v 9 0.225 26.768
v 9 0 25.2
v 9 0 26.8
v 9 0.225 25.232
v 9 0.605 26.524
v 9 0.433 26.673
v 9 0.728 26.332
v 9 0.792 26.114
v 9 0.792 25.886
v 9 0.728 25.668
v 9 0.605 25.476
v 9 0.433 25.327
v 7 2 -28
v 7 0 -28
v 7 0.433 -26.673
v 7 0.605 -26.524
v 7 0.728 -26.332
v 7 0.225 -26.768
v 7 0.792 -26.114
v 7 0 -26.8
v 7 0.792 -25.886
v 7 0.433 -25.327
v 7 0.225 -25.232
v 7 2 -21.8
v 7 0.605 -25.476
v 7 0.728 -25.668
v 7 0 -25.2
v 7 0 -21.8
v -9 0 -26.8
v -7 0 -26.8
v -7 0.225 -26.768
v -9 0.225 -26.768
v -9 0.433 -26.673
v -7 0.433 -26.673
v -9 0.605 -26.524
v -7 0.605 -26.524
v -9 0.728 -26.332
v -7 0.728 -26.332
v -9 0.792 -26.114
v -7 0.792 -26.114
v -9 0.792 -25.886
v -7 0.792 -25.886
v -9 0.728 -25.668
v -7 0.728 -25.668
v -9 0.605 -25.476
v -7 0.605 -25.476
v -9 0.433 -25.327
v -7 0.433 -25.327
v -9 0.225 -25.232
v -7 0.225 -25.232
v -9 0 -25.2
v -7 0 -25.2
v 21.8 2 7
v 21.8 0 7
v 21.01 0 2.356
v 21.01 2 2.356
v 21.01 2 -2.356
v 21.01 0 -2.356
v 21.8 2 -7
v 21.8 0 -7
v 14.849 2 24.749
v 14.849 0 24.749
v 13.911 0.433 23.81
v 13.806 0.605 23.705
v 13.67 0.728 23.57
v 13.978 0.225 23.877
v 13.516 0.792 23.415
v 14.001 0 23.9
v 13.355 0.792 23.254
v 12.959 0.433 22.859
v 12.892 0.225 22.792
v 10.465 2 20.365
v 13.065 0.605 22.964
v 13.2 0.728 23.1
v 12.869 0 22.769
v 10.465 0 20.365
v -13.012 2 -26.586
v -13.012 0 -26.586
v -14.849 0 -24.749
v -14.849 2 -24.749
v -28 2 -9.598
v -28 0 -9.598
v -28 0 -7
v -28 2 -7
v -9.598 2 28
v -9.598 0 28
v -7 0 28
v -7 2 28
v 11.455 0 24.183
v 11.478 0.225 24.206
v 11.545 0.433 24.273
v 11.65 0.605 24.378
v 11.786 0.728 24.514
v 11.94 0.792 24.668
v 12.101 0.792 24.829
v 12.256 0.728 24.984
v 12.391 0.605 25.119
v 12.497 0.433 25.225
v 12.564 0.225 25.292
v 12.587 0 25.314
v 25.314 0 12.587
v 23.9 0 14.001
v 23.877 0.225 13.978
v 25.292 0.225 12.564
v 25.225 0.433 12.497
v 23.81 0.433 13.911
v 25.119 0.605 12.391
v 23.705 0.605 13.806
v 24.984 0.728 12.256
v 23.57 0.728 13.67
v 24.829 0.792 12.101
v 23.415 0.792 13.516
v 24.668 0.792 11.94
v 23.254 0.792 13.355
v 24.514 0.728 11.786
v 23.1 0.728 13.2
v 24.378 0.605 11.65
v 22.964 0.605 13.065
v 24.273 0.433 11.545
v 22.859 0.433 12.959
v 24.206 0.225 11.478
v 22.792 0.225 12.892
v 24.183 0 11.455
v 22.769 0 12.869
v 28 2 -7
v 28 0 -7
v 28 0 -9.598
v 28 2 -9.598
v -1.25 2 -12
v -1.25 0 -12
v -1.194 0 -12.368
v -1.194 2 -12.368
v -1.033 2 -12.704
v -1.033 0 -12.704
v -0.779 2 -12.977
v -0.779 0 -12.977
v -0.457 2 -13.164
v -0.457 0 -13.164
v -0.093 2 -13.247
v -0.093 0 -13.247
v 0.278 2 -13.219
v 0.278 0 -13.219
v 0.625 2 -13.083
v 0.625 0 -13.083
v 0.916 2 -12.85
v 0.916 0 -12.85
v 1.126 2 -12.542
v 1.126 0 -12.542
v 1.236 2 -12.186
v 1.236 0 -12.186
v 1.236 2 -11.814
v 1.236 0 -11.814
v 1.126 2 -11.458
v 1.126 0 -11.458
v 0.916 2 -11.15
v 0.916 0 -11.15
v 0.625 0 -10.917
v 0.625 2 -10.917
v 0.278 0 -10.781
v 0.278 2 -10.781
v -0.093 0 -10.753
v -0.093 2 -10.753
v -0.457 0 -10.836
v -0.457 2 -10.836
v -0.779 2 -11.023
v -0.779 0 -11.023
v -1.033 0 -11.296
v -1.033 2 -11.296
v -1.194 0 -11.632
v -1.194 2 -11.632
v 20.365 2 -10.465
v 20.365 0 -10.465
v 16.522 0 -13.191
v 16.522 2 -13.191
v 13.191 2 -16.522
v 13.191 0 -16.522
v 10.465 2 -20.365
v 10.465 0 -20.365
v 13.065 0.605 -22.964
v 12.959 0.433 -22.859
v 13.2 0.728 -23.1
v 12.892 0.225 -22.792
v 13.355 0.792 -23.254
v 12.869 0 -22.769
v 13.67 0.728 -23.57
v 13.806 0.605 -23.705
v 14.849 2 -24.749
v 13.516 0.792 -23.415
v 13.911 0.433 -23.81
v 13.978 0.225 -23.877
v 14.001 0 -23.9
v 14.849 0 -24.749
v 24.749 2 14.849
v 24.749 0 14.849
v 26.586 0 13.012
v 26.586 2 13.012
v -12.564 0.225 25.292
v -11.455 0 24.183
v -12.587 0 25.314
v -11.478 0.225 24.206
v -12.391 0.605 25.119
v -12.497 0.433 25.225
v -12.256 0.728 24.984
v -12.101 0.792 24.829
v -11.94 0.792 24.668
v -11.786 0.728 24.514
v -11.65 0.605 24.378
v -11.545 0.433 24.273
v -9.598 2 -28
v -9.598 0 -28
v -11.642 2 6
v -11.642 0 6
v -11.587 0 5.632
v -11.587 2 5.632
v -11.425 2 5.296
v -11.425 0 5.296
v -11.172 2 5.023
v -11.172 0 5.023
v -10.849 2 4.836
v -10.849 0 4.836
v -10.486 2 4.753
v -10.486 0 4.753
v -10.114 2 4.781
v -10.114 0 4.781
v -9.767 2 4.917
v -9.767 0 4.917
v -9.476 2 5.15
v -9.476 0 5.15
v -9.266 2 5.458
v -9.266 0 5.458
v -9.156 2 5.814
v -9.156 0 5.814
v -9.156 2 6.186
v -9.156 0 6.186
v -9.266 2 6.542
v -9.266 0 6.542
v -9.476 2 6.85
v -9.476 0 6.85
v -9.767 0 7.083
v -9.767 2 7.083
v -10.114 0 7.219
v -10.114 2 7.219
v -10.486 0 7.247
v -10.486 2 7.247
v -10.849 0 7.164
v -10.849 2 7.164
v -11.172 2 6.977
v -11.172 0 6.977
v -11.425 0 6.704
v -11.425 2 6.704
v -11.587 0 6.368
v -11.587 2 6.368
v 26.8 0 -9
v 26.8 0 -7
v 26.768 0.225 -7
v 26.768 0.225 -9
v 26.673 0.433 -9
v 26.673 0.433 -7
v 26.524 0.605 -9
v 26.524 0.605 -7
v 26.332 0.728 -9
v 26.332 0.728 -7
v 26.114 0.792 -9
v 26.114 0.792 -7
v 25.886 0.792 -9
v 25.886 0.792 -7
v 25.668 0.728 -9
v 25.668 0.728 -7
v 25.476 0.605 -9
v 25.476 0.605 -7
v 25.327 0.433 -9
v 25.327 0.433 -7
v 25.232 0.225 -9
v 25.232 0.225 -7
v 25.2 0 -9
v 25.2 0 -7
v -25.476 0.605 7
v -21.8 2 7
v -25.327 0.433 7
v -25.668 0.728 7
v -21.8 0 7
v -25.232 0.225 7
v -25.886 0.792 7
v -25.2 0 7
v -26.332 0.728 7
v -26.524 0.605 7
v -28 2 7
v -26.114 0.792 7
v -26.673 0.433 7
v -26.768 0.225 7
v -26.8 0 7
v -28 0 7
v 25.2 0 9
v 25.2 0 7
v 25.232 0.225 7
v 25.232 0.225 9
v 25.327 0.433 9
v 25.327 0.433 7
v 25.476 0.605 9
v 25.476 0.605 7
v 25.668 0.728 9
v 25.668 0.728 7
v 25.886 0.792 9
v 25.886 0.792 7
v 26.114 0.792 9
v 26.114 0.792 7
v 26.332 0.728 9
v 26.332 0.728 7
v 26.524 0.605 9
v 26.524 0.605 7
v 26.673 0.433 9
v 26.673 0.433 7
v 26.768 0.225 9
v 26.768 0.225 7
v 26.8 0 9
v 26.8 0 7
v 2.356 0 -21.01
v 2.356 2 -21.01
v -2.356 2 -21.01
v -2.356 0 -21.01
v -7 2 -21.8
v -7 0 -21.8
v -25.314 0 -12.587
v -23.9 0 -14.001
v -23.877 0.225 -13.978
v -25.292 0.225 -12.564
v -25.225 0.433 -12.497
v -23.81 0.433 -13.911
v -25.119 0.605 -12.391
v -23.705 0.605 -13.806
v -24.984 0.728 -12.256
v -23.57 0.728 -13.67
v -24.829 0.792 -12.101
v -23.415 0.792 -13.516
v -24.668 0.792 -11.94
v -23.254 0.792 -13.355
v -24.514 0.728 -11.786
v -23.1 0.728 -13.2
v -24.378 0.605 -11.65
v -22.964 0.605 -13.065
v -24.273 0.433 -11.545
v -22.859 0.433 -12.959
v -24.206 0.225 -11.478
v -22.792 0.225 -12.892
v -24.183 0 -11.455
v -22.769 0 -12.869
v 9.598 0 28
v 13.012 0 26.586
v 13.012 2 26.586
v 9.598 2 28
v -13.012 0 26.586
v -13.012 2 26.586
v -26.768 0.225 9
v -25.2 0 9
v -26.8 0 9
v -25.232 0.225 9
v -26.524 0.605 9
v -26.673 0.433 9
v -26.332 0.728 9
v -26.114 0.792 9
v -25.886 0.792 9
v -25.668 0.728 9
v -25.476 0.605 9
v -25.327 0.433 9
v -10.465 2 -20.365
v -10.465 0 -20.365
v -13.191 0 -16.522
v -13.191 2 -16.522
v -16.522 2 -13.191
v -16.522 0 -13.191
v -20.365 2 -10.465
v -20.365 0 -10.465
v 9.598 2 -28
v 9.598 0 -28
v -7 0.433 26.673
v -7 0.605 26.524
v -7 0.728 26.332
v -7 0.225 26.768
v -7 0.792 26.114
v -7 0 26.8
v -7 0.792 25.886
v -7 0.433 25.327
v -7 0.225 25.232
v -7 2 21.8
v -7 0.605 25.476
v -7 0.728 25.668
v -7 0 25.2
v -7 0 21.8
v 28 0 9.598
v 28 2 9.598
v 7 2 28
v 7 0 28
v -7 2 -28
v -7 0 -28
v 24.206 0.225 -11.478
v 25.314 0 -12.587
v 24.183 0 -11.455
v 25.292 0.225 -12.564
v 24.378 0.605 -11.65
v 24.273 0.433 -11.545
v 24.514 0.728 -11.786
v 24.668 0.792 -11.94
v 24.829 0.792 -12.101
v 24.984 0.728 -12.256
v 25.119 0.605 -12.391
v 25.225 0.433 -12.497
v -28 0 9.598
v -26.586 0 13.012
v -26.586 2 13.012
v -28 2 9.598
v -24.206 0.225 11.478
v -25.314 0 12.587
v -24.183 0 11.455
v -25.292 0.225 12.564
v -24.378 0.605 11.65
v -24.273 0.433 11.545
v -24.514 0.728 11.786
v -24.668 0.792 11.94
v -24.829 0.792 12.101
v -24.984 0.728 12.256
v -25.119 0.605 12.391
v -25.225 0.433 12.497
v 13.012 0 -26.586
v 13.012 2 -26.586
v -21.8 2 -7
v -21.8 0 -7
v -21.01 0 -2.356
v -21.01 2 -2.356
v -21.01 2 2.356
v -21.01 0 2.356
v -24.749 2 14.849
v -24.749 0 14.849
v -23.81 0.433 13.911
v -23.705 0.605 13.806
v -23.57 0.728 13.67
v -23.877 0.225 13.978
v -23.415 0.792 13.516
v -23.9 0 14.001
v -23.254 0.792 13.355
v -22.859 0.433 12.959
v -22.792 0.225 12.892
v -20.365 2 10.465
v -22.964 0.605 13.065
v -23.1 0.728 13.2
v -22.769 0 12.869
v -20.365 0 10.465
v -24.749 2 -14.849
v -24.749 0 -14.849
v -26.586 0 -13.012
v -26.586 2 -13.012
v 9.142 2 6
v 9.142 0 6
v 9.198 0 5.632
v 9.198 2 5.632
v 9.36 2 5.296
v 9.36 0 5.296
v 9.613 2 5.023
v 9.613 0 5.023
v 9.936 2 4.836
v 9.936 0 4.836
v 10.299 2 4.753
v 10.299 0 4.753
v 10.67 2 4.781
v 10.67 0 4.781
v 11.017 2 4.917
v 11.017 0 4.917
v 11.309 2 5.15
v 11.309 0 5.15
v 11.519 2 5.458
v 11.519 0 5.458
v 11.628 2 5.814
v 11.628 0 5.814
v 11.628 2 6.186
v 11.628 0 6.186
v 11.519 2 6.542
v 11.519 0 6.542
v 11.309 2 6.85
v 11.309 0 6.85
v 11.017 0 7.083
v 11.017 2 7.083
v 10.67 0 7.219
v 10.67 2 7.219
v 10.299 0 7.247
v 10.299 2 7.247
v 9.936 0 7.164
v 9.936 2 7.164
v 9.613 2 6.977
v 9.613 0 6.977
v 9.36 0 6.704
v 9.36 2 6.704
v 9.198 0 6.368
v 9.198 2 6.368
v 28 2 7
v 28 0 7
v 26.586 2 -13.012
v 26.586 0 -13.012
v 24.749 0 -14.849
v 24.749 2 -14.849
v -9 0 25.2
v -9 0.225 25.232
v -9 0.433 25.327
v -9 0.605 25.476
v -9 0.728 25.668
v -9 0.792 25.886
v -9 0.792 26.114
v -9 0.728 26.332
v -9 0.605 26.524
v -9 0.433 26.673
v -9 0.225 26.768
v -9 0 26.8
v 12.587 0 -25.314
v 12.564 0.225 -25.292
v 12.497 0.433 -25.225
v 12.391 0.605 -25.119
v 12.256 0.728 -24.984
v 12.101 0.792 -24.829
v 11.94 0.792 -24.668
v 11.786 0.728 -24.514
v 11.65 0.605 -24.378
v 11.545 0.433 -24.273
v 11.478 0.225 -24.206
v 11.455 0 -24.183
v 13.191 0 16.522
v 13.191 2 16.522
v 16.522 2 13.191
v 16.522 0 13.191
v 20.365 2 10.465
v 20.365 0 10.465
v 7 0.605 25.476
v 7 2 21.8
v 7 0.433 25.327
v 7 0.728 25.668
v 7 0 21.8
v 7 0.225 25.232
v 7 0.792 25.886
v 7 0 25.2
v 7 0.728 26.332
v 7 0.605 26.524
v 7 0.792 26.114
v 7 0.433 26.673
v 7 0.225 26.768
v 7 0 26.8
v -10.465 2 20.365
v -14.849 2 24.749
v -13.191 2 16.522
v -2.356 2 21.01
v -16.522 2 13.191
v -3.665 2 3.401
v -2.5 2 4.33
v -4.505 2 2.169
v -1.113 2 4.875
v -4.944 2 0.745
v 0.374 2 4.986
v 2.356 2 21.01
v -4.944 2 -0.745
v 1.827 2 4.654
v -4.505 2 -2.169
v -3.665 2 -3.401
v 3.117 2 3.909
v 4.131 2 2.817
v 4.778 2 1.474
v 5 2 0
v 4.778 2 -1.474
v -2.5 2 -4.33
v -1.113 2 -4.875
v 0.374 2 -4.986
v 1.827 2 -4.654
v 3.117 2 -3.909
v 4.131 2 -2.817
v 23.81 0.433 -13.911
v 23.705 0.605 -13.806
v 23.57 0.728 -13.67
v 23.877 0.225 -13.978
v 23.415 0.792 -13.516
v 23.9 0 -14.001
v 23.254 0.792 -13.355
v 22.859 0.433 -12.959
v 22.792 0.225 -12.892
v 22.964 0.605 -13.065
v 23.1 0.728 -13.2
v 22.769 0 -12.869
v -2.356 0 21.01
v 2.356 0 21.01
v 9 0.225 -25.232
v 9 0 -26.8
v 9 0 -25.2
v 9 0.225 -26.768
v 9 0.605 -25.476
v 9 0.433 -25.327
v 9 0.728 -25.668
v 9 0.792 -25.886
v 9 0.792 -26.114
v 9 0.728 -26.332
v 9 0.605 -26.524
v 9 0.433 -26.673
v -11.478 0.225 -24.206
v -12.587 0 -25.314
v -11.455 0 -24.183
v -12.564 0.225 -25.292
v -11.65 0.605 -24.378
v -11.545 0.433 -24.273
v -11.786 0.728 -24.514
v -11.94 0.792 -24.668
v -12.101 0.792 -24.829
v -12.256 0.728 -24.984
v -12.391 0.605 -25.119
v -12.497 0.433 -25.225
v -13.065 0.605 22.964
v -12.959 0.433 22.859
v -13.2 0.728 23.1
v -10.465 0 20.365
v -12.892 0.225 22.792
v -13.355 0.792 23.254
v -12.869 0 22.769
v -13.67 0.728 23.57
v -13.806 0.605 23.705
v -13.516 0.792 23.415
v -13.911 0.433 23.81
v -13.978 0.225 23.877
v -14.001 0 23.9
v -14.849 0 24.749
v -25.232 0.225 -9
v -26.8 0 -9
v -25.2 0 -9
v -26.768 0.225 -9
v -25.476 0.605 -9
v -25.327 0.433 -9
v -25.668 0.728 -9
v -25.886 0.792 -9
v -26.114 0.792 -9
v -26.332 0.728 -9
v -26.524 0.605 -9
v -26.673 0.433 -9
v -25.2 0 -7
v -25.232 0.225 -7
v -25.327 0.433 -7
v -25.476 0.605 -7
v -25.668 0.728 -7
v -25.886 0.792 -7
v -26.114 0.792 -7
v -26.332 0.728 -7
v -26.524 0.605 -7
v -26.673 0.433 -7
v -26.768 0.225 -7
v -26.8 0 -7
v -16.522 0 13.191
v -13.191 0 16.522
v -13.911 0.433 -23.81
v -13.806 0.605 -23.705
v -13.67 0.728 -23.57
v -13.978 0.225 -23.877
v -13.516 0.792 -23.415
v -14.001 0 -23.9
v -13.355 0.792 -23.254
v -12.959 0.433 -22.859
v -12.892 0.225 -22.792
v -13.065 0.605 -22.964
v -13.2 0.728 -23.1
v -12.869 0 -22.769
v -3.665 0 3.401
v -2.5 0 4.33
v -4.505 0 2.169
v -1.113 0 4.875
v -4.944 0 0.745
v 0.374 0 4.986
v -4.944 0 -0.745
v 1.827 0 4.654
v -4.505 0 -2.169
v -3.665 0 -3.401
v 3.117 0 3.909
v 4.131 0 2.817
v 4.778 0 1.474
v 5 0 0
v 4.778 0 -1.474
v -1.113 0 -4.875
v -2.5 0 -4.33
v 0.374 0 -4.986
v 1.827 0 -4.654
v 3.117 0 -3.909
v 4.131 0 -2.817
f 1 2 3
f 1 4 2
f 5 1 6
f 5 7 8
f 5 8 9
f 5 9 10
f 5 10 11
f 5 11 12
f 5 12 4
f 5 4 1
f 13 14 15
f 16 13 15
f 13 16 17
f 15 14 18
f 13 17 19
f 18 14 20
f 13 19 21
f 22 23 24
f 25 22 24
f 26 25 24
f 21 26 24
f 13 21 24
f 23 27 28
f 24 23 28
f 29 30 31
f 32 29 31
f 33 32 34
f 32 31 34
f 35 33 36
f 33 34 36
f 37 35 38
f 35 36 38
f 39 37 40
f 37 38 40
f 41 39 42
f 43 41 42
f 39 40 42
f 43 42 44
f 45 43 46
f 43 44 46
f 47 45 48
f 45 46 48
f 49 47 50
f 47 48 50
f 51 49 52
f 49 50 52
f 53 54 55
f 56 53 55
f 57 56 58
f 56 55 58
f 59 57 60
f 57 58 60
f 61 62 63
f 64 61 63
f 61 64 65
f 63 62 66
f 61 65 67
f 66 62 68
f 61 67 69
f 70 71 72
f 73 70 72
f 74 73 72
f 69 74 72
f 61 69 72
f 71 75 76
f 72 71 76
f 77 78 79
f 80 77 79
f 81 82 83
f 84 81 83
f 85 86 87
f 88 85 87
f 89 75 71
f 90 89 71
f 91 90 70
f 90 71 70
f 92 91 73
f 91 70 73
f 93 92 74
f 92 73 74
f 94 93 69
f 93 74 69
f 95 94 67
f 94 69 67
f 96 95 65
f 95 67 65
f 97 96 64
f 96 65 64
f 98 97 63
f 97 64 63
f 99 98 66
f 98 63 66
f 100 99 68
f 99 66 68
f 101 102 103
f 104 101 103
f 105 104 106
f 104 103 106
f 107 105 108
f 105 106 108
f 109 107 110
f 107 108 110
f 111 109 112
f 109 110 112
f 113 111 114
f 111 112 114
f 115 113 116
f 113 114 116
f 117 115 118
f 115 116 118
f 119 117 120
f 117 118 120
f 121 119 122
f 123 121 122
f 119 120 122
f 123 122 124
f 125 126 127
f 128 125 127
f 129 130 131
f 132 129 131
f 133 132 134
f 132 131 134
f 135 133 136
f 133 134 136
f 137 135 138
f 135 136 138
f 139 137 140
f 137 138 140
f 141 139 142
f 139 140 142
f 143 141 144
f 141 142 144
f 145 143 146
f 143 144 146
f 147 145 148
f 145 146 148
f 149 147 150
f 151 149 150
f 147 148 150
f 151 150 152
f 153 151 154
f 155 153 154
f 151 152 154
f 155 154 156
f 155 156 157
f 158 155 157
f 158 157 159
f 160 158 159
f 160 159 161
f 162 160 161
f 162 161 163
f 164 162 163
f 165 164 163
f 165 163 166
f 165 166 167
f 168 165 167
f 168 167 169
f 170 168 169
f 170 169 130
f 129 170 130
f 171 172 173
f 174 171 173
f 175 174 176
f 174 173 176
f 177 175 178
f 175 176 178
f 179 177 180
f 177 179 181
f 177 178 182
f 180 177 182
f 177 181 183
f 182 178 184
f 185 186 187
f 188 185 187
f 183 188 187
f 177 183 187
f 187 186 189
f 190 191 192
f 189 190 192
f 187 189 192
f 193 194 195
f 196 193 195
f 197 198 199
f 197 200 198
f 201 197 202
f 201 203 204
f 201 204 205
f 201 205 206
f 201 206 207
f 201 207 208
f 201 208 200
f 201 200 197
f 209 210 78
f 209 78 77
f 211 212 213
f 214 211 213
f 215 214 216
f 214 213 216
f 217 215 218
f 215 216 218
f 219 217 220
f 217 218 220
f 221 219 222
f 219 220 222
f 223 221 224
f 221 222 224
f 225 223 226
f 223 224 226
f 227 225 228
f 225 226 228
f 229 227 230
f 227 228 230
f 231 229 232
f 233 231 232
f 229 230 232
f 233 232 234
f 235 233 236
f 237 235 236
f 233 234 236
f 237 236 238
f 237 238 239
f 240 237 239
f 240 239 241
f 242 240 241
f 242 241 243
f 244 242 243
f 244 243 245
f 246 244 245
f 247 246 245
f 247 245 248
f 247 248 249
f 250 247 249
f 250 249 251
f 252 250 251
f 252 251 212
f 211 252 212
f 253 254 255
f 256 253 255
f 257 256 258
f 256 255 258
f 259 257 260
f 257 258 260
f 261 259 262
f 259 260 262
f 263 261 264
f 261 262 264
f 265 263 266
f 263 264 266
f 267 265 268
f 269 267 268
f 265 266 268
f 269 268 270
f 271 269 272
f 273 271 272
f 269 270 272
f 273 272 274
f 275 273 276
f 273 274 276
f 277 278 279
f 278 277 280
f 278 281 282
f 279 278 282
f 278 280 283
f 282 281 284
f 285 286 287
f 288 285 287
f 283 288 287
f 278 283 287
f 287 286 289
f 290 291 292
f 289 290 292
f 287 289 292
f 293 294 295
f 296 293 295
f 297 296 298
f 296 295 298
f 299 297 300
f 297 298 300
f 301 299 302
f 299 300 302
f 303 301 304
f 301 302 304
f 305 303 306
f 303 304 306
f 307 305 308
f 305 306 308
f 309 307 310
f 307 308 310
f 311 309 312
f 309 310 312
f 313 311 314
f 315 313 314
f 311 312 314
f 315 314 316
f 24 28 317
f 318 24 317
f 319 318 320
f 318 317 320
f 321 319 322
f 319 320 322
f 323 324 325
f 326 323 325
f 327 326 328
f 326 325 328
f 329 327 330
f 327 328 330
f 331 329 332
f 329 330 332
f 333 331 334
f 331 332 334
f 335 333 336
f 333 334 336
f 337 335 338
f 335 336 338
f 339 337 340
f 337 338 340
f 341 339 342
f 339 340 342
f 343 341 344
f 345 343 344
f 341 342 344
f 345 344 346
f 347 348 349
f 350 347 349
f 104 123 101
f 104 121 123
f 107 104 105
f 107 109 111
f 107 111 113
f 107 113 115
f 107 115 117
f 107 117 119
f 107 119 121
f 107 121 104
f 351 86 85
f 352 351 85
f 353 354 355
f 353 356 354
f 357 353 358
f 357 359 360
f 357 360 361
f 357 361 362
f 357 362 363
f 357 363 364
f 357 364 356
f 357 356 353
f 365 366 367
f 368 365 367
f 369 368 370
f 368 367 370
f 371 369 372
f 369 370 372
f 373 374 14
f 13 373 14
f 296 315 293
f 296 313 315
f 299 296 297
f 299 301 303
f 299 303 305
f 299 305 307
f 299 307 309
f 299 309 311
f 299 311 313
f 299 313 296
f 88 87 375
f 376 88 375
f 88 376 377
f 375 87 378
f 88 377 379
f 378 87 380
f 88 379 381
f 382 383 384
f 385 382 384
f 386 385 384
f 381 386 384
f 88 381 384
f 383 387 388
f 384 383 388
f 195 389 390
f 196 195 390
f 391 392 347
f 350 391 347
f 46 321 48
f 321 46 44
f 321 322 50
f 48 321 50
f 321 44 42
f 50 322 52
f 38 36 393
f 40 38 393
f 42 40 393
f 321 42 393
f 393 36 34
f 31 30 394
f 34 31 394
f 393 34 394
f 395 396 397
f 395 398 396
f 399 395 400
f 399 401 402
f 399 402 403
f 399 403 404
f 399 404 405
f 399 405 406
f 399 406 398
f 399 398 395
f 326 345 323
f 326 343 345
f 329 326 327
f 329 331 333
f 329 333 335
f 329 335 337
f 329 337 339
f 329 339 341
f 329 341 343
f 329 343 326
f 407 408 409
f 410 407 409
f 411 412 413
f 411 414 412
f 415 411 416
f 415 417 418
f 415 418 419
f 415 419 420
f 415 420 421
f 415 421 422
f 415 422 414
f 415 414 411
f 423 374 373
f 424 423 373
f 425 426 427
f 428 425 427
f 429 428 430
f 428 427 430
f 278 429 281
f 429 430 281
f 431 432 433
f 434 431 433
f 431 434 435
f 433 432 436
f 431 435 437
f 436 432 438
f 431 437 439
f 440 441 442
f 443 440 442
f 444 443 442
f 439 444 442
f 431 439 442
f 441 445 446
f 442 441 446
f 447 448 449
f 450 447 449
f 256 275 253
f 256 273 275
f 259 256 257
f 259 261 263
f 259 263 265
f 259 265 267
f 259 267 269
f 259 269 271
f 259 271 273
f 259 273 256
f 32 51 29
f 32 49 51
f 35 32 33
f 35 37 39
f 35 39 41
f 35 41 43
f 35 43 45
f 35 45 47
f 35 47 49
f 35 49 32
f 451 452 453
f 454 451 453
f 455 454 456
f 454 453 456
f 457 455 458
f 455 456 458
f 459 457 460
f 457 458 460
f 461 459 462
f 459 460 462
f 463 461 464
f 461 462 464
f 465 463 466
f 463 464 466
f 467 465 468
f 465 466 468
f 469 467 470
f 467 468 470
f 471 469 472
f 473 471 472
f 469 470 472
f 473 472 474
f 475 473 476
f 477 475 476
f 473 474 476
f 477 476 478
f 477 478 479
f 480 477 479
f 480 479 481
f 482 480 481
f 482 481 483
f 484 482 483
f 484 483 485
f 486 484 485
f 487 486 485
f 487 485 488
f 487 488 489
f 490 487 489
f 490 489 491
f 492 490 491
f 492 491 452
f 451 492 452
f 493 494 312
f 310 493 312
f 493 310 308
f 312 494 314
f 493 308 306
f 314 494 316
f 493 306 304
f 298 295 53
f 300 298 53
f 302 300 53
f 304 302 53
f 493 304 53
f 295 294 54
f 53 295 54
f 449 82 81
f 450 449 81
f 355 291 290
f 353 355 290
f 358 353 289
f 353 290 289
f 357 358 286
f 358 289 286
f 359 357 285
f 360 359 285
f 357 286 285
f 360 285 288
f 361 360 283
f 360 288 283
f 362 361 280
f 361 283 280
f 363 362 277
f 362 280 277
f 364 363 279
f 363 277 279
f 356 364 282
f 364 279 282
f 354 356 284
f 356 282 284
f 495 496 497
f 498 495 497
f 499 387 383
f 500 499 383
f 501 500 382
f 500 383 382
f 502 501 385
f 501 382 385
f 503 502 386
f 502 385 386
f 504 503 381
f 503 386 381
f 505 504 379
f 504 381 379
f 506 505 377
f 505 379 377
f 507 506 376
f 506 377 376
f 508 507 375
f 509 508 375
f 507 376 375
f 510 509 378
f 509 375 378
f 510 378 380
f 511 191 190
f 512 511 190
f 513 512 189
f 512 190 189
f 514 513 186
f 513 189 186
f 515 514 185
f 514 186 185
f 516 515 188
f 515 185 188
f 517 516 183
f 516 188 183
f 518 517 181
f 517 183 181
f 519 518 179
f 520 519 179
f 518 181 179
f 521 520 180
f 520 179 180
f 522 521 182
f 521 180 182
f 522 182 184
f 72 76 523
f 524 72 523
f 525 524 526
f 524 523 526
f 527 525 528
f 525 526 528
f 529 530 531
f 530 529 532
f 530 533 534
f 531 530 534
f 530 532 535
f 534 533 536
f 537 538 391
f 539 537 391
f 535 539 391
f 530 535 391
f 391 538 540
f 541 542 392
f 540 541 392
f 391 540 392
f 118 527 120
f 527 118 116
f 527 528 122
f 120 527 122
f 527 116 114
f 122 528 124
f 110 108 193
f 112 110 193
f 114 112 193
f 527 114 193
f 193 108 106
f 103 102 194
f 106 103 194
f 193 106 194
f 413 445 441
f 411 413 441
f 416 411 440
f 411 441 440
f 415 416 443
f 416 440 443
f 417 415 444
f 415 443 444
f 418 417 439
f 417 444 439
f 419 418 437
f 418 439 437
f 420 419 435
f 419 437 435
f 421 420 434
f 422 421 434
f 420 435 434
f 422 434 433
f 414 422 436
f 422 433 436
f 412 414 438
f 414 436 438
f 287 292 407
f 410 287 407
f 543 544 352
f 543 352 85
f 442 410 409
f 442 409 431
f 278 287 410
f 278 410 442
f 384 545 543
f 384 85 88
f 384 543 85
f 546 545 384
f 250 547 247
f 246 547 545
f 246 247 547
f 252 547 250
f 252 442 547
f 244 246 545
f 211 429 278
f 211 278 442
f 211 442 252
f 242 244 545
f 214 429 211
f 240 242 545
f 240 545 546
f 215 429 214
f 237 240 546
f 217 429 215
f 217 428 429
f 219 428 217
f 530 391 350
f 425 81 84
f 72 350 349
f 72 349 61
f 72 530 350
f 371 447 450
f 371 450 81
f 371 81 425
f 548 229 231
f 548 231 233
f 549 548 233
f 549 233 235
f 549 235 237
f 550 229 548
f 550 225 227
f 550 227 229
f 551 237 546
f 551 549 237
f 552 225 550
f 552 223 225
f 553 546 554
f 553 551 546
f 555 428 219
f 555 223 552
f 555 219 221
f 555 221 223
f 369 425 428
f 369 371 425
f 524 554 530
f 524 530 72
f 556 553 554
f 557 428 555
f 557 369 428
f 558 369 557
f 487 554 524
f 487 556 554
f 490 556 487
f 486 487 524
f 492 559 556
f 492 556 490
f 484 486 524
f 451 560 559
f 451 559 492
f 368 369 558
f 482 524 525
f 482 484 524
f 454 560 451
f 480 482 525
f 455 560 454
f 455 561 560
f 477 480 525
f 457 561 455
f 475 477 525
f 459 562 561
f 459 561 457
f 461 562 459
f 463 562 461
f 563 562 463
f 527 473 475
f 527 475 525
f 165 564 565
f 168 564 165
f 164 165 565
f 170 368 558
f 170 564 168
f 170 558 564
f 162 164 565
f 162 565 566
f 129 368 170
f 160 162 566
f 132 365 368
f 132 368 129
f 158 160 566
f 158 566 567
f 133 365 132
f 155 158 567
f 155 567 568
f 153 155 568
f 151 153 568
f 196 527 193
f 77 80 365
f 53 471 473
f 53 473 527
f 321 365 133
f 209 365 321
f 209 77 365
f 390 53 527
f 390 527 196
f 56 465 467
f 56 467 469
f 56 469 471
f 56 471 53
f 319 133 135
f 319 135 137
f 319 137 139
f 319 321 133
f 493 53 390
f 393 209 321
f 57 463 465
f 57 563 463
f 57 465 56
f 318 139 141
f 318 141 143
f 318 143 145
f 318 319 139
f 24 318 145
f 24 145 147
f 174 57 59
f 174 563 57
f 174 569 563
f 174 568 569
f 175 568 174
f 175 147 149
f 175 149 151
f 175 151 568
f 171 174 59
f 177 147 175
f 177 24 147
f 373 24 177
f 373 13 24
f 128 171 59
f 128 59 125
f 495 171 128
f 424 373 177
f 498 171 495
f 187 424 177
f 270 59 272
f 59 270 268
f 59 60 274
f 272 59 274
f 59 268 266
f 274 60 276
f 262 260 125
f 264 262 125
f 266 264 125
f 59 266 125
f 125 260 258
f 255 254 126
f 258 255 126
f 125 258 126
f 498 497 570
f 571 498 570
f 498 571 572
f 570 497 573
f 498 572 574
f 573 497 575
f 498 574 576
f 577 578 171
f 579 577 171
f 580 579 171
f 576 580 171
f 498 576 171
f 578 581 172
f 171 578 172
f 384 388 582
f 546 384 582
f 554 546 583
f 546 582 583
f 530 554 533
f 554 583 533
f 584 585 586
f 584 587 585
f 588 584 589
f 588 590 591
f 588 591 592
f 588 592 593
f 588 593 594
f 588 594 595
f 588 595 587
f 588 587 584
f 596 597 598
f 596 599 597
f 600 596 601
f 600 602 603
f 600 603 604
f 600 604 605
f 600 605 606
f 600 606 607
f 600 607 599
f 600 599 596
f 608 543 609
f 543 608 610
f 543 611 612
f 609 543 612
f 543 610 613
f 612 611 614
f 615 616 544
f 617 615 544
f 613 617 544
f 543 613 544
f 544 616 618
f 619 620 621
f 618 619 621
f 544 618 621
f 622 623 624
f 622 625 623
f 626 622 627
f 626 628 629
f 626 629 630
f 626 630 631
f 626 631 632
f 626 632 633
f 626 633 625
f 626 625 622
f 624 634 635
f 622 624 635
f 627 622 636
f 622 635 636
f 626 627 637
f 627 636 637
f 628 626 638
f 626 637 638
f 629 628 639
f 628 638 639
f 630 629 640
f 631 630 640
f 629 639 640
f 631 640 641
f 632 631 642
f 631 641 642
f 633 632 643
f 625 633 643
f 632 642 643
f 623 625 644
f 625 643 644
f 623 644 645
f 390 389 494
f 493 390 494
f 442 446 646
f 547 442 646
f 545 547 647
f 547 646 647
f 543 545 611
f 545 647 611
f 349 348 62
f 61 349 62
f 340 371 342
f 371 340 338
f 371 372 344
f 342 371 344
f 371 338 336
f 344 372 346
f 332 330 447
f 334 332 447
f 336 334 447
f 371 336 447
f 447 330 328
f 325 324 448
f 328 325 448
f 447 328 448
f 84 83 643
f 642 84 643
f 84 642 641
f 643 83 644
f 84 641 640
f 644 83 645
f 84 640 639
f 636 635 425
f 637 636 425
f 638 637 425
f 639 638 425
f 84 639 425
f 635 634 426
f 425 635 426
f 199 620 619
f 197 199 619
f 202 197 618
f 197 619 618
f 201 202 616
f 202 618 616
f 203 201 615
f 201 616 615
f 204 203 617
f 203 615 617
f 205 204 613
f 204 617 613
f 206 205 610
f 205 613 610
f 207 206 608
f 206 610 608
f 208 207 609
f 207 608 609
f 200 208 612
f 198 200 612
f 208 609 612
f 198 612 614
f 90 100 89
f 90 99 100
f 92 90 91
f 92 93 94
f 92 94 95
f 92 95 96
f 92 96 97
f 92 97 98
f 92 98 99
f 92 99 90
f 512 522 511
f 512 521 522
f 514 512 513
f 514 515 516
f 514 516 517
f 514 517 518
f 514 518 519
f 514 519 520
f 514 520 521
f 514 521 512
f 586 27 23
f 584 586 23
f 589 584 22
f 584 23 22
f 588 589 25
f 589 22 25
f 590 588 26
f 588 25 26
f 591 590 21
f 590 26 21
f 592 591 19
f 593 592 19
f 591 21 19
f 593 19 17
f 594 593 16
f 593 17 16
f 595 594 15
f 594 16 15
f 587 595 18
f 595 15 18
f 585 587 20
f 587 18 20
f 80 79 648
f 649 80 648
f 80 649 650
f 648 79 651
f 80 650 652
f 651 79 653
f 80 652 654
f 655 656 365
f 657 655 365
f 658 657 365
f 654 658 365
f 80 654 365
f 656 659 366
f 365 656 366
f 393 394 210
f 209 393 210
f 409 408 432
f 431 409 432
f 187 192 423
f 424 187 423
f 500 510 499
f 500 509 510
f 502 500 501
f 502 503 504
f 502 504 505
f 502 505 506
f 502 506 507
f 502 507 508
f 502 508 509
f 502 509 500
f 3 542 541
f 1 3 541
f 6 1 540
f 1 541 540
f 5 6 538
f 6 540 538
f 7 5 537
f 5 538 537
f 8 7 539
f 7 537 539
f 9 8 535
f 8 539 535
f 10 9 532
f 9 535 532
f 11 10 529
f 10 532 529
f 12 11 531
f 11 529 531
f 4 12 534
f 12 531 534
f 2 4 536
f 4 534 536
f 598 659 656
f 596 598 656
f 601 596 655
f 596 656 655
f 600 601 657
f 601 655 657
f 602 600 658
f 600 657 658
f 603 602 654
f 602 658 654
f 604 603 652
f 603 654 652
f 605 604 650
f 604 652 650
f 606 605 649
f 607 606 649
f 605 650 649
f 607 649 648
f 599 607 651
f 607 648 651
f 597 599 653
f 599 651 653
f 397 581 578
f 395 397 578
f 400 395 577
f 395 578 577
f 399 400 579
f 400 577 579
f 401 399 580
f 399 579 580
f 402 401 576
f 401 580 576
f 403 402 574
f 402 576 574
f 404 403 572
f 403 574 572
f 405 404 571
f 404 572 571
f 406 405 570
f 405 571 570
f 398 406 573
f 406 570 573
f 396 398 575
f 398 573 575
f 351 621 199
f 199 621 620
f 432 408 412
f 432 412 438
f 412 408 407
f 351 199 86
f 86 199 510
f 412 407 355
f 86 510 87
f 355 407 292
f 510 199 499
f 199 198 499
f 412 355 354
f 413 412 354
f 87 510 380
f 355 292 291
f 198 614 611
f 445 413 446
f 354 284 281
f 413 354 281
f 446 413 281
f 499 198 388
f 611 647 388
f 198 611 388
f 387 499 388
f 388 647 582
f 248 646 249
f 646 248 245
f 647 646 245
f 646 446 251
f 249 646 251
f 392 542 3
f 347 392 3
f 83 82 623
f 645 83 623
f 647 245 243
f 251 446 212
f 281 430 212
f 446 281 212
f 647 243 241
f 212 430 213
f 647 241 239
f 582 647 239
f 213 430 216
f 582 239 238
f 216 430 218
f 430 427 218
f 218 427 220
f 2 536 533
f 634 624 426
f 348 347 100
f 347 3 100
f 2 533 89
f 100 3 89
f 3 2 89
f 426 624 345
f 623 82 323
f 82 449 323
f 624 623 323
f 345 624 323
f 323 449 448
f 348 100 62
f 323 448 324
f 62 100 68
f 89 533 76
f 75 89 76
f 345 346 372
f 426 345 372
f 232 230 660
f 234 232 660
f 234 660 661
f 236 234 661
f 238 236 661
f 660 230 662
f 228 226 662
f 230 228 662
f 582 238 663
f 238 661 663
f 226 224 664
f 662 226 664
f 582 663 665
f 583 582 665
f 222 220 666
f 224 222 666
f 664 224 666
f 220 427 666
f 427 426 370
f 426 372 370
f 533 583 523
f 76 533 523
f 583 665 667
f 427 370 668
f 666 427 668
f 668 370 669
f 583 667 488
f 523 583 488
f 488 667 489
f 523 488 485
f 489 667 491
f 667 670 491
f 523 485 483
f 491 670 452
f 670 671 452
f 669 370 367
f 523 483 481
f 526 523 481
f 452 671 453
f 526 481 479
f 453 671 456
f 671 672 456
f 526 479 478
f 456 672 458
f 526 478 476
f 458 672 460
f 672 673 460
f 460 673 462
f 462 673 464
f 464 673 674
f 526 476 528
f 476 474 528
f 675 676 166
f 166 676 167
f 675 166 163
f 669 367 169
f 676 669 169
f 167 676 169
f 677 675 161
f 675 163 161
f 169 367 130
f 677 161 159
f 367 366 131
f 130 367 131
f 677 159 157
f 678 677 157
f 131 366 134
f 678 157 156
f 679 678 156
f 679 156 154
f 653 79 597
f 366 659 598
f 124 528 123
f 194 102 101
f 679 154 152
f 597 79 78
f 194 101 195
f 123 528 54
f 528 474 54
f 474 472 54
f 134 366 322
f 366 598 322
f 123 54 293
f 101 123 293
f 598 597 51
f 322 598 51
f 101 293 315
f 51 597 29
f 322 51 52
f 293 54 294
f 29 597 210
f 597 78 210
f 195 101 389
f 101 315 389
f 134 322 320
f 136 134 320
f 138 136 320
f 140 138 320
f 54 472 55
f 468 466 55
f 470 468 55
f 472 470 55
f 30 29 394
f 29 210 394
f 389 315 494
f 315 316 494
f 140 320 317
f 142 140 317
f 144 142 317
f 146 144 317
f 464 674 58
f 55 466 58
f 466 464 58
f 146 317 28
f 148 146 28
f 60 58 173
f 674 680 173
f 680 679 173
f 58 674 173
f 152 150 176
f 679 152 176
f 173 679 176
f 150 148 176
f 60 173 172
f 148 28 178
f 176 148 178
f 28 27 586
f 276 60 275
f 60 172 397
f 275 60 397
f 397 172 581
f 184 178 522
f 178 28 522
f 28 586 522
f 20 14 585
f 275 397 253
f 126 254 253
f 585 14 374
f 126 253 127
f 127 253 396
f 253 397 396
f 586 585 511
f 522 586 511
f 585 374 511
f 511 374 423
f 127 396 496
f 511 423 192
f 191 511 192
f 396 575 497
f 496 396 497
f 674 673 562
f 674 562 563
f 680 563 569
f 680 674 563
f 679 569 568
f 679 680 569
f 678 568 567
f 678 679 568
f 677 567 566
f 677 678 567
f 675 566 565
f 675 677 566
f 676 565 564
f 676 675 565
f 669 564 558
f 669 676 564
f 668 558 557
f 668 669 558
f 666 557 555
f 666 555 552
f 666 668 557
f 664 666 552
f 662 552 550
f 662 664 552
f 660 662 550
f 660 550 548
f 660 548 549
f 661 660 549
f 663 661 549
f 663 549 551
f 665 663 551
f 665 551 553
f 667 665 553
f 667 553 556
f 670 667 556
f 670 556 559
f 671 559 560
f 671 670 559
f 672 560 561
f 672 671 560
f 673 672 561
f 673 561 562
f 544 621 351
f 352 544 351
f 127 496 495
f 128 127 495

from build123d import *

# Parameters (mm, degrees)
SKETCH2_R                 = 5
BOSS_EXTRUDE2_DEPTH       = 2
SKETCH3_R                 = 0.8
CUT_EXTRUDE1_DEPTH        = 2
SKETCH4_R                 = 0.8
CUT_EXTRUDE2_DEPTH        = 2
CHAMFER1_SIZE             = 2
CIRPATTERN3_COUNT         = 8
F_2_5MM_DOWEL_HOLE1_D     = 2.5
F_2_5MM_DOWEL_HOLE1_DEPTH = 10
F_2_5MM_DOWEL_HOLE1_TIP   = 0.751075774


with BuildPart() as part:
    # Sketch2 → Boss-Extrude2 (new body)
    with BuildSketch(Plane(origin=(0, 0, 0), x_dir=(1, 0, 0), z_dir=(0, 1, 0))):
        with BuildLine():
            Line((-7, 21.800048896), (-7, 28.000048896))
            Line((-7, 28.000048896), (-11.598, 28.000048896))
            Line((-11.598, 28.000048896), (-14.84927698, 24.748771917))
            Line((-14.84927698, 24.748771917), (-10.465214937, 20.364709873))
            ThreePointArc((-10.465214937, 20.364709873), (-14.786262044, 14.786262044), (-20.364709873, 10.465214937))
            Line((-20.364709873, 10.465214937), (-24.748771917, 14.84927698))
            Line((-24.748771917, 14.84927698), (-28.000048896, 11.598))
            Line((-28.000048896, 11.598), (-28.000048896, 7))
            Line((-28.000048896, 7), (-21.800048896, 7))
            ThreePointArc((-21.800048896, 7), (-20.91093232, 0), (-21.800048896, -7))
            Line((-21.800048896, -7), (-28.000048896, -7))
            Line((-28.000048896, -7), (-28.000048896, -11.598))
            Line((-28.000048896, -11.598), (-24.748771917, -14.84927698))
            Line((-24.748771917, -14.84927698), (-20.364709873, -10.465214937))
            ThreePointArc((-20.364709873, -10.465214937), (-14.786262044, -14.786262044), (-10.465214937, -20.364709873))
            Line((-10.465214937, -20.364709873), (-14.84927698, -24.748771917))
            Line((-14.84927698, -24.748771917), (-11.598, -28.000048896))
            Line((-11.598, -28.000048896), (-7, -28.000048896))
            Line((-7, -28.000048896), (-7, -21.800048896))
            ThreePointArc((-7, -21.800048896), (0, -20.91093232), (7, -21.800048896))
            Line((7, -21.800048896), (7, -28.000048896))
            Line((7, -28.000048896), (11.598, -28.000048896))
            Line((11.598, -28.000048896), (14.84927698, -24.748771917))
            Line((14.84927698, -24.748771917), (10.465214937, -20.364709873))
            ThreePointArc((10.465214937, -20.364709873), (14.786262044, -14.786262044), (20.364709873, -10.465214937))
            Line((20.364709873, -10.465214937), (24.748771917, -14.84927698))
            Line((24.748771917, -14.84927698), (28.000048896, -11.598))
            Line((28.000048896, -11.598), (28.000048896, -7))
            Line((28.000048896, -7), (21.800048896, -7))
            ThreePointArc((21.800048896, -7), (20.91093232, 0), (21.800048896, 7))
            Line((21.800048896, 7), (28.000048896, 7))
            Line((28.000048896, 7), (28.000048896, 11.598))
            Line((28.000048896, 11.598), (24.748771917, 14.84927698))
            Line((24.748771917, 14.84927698), (20.364709873, 10.465214937))
            ThreePointArc((20.364709873, 10.465214937), (14.786262044, 14.786262044), (10.465214937, 20.364709873))
            Line((10.465214937, 20.364709873), (14.84927698, 24.748771917))
            Line((14.84927698, 24.748771917), (11.598, 28.000048896))
            Line((11.598, 28.000048896), (7, 28.000048896))
            Line((7, 28.000048896), (7, 21.800048896))
            ThreePointArc((7, 21.800048896), (0, 20.91093232), (-7, 21.800048896))
        make_face()
        Circle(SKETCH2_R, mode=Mode.SUBTRACT)
    extrude(amount=BOSS_EXTRUDE2_DEPTH)

    # Sketch3 → Cut-Extrude1 (cut)
    with BuildSketch(Plane.ZY.offset(-7)):
        with Locations((-26.000048896, 0)):
            Circle(SKETCH3_R)
    cut_extrude1 = extrude(amount=-CUT_EXTRUDE1_DEPTH, mode=Mode.SUBTRACT)

    # Sketch4 → Cut-Extrude2 (cut)
    with BuildSketch(Plane(origin=(-7, 0, 0), x_dir=(0, 0, -1), z_dir=(1, 0, 0))):
        with Locations((26.000048896, 0)):
            Circle(SKETCH4_R)
    cut_extrude2 = extrude(amount=-CUT_EXTRUDE2_DEPTH, mode=Mode.SUBTRACT)

    # Chamfer1
    chamfer1_edges = [part.edges().sort_by_distance(p)[0] for p in [
        (-11.598, 1, -28.000048896),
        (11.598, 1, -28.000048896),
        (28.000048896, 1, -11.598),
        (28.000048896, 1, 11.598),
        (11.598, 1, 28.000048896),
        (-11.598, 1, 28.000048896),
        (-28.000048896, 1, 11.598),
        (-28.000048896, 1, -11.598),
    ]]
    chamfer(chamfer1_edges, length=CHAMFER1_SIZE)

    # CirPattern3: Cut-Extrude1, Cut-Extrude2 ×8 about axis
    cirpattern3_axis = Axis((0, 0, 0), (0, 1, 0))
    for i in range(1, CIRPATTERN3_COUNT):
        add(cut_extrude1.rotate(cirpattern3_axis, i * 360 / CIRPATTERN3_COUNT), mode=Mode.SUBTRACT)
        add(cut_extrude2.rotate(cirpattern3_axis, i * 360 / CIRPATTERN3_COUNT), mode=Mode.SUBTRACT)

    # Ø2.5mm Dowel Hole1
    with Locations(Plane(origin=(0, 2, 0), x_dir=(1, 0, 0), z_dir=(0, 1, 0))):
        with Locations((0, 12), (10.392304845, -6), (-10.392304845, -6), (0, 0)):
            Hole(F_2_5MM_DOWEL_HOLE1_D / 2, depth=F_2_5MM_DOWEL_HOLE1_DEPTH)
            with Locations((0, 0, -(F_2_5MM_DOWEL_HOLE1_DEPTH + F_2_5MM_DOWEL_HOLE1_TIP / 2))):  # 118° drill point
                Cone(0, F_2_5MM_DOWEL_HOLE1_D / 2, F_2_5MM_DOWEL_HOLE1_TIP, mode=Mode.SUBTRACT)


solid = part.part
